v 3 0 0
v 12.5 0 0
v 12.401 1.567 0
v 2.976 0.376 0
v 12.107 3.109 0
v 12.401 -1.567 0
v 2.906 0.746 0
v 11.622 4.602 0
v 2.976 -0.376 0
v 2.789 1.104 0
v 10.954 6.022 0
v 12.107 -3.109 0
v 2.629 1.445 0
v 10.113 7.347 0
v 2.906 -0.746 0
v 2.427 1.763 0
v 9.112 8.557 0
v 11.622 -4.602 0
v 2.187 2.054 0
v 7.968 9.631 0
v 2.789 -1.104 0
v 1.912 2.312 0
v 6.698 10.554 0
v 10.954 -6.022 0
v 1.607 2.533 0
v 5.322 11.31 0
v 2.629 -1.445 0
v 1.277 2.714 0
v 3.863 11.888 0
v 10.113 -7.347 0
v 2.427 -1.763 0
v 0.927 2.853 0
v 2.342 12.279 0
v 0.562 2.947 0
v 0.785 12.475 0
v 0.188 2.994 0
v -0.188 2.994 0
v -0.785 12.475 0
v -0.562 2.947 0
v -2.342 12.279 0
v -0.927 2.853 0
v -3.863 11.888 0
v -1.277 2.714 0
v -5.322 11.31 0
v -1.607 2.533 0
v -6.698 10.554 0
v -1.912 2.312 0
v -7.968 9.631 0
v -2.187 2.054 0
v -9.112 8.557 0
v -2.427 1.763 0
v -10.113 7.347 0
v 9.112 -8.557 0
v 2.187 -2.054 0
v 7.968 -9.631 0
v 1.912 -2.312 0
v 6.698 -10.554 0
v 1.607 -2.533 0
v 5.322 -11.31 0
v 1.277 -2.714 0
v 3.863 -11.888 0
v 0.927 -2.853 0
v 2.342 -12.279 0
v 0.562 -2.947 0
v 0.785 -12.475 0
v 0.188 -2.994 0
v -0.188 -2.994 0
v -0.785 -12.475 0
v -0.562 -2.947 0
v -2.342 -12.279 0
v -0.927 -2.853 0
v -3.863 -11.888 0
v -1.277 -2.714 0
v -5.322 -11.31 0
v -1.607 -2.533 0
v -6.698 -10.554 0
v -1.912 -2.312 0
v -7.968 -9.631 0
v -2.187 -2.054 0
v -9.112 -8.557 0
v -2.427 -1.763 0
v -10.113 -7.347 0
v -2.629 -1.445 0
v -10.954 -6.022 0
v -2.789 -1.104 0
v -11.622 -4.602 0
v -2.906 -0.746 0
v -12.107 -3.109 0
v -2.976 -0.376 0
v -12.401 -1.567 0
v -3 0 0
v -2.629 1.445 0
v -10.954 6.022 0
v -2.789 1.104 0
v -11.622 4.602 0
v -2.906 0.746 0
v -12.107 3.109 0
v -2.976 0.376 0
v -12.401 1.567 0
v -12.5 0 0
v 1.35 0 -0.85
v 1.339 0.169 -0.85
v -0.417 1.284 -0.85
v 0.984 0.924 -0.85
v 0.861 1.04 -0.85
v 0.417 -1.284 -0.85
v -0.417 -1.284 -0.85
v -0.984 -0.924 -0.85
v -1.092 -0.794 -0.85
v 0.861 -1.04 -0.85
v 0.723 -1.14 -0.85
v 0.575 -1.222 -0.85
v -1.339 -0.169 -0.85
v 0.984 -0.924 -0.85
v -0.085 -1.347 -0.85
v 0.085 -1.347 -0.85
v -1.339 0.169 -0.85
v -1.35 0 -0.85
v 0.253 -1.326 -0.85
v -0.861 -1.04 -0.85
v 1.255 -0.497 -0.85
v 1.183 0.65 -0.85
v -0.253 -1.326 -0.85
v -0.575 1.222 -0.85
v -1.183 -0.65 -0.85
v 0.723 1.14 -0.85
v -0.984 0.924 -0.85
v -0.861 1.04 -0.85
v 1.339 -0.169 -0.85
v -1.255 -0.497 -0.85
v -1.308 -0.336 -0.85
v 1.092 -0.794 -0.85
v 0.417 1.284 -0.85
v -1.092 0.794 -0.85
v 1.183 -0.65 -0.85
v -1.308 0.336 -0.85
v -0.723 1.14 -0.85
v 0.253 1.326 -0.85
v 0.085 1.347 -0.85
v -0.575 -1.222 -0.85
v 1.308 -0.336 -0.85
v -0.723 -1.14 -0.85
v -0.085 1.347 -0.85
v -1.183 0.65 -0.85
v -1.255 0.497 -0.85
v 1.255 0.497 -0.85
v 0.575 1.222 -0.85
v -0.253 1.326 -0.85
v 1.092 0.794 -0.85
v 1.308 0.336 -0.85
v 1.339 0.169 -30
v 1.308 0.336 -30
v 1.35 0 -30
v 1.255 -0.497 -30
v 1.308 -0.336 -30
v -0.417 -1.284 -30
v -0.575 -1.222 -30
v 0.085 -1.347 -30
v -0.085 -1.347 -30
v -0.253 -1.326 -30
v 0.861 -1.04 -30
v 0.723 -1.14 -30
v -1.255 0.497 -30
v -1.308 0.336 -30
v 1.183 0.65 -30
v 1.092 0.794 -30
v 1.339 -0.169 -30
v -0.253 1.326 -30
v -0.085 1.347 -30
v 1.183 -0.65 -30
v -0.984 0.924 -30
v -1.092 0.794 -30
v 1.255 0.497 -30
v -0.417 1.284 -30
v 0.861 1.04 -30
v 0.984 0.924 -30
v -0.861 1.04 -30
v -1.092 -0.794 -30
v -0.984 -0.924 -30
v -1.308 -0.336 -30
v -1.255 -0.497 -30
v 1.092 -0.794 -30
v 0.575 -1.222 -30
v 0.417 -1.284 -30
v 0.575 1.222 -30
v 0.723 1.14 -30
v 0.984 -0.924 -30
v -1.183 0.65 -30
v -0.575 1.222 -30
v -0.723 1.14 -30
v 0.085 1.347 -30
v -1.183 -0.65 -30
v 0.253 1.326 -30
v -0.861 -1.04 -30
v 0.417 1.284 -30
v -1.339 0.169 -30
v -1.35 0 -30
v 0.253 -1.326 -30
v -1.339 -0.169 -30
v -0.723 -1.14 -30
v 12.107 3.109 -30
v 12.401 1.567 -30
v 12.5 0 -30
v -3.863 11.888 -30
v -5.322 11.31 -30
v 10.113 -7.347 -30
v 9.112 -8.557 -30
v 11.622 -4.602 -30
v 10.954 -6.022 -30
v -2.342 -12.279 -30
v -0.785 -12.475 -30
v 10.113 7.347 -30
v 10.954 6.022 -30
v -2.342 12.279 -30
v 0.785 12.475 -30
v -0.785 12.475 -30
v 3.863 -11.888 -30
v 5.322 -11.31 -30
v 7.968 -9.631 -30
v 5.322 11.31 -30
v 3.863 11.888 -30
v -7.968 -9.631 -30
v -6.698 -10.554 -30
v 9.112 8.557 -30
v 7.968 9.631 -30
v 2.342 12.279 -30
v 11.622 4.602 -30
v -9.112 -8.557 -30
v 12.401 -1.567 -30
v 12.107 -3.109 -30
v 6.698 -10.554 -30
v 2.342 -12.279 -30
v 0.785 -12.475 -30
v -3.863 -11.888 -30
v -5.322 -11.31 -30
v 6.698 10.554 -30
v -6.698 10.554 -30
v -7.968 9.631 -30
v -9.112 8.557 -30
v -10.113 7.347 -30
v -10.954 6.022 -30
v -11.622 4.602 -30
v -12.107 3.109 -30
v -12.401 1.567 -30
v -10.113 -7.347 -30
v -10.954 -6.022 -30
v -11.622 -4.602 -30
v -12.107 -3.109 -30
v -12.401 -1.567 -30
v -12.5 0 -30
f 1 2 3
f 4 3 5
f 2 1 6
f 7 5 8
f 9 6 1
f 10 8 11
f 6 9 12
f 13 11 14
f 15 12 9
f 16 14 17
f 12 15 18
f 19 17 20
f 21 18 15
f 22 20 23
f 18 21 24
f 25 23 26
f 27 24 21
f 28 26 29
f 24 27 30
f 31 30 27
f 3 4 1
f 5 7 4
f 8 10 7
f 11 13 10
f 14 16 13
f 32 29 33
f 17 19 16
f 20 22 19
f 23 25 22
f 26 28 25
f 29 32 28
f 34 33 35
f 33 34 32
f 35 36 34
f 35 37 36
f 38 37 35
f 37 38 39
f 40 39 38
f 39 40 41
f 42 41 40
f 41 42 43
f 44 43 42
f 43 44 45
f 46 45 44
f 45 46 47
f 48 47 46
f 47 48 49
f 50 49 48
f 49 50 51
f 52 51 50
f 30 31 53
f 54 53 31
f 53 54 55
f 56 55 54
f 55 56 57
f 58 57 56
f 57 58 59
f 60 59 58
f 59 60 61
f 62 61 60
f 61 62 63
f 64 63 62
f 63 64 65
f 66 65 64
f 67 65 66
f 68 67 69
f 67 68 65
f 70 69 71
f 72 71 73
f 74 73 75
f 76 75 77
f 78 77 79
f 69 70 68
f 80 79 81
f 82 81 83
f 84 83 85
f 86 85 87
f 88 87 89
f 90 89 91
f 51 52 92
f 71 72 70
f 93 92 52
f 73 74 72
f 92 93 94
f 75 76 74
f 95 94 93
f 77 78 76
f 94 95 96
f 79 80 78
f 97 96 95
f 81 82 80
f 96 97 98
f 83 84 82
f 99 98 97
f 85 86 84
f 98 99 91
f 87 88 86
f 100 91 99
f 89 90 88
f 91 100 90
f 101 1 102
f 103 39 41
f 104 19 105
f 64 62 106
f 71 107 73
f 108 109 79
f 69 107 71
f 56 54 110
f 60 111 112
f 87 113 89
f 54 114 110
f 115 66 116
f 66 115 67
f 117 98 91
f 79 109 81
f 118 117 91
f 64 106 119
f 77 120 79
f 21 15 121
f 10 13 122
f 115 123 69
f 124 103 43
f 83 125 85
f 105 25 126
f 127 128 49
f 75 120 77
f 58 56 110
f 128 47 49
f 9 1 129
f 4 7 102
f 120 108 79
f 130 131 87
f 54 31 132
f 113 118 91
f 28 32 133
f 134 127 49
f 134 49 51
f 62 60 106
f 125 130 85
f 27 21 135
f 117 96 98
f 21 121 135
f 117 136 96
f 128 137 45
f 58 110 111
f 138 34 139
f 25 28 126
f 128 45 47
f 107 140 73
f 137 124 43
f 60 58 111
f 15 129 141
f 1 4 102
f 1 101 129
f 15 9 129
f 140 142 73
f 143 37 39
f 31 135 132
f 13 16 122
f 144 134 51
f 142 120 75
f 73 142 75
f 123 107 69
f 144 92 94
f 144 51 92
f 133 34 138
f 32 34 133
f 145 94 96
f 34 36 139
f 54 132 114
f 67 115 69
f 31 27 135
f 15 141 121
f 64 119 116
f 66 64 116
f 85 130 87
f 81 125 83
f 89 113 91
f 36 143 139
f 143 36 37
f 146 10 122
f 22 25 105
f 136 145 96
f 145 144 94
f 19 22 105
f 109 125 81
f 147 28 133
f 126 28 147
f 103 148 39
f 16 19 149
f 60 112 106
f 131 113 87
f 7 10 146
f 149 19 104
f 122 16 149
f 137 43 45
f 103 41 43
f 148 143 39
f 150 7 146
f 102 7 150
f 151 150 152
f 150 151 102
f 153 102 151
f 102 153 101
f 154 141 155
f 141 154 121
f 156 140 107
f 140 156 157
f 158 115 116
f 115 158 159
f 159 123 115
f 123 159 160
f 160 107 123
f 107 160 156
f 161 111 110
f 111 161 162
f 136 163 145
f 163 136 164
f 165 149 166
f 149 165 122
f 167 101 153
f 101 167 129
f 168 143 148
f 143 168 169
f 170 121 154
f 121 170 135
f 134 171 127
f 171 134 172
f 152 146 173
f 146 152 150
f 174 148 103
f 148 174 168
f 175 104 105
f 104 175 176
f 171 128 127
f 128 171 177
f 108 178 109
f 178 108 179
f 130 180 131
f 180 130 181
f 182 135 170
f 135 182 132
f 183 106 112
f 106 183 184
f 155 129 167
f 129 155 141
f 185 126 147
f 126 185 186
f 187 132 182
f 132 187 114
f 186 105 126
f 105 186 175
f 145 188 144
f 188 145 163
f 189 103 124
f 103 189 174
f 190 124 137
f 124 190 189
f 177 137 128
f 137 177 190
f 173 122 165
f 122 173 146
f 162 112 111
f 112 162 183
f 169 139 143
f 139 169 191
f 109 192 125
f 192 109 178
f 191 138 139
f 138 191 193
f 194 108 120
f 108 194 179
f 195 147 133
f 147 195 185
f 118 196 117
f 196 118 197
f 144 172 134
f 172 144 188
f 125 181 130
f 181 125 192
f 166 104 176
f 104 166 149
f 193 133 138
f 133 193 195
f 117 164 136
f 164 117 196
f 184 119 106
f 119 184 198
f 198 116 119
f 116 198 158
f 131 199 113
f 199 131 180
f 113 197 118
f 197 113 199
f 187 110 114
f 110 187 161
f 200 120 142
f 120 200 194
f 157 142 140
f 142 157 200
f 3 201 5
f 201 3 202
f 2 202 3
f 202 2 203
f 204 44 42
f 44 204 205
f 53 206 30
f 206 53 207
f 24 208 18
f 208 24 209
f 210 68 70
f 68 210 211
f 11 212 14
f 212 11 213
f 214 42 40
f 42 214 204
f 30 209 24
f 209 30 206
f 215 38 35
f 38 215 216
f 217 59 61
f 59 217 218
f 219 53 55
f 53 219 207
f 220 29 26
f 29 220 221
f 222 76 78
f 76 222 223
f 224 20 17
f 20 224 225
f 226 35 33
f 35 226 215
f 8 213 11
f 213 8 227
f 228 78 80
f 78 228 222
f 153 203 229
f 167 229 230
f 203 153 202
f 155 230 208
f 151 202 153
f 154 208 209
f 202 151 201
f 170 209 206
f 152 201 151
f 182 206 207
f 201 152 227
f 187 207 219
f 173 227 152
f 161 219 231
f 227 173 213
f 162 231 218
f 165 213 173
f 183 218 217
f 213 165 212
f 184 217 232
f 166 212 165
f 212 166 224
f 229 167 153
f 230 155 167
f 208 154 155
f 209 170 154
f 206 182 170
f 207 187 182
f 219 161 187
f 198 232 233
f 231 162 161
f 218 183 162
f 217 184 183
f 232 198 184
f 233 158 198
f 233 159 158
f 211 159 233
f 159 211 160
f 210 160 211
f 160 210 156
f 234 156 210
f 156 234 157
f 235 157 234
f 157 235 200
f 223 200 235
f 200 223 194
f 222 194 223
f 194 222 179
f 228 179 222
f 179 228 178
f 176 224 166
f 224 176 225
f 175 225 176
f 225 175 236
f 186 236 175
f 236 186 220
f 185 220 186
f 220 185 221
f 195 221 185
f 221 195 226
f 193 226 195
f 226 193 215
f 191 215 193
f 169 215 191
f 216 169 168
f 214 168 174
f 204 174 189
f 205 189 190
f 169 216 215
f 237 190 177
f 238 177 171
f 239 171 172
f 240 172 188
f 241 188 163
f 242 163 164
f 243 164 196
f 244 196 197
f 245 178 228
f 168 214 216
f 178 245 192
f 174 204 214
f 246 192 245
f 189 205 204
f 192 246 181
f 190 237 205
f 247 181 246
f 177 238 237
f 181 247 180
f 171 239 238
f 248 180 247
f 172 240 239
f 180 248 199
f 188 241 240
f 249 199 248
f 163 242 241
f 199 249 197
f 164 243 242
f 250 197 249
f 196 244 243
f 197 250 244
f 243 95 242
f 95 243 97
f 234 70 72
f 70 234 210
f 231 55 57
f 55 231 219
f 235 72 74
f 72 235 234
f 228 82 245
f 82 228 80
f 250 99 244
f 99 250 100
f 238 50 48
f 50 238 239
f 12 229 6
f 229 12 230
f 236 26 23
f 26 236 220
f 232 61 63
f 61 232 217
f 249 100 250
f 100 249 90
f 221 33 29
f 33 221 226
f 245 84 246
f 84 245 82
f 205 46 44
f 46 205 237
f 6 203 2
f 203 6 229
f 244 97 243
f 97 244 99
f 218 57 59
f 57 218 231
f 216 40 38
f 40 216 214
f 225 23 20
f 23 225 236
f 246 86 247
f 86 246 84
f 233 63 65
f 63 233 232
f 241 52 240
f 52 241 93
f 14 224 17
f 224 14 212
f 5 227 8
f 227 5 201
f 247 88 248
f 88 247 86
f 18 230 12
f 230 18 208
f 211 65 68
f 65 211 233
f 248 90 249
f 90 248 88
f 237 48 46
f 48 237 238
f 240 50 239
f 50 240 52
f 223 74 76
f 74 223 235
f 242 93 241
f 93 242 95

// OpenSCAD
$fn = 50;

difference() {
	union() {
		translate(v = [0, 0, -30.0]) {
			cylinder(h = 30, r = 12.5);
		}
	}
	union() {
		translate(v = [0, 0, 0]) {
			rotate(a = [0, 0, 0]) {
				difference() {
					union() {
						translate(v = [0, 0, -33.0]) {
							cylinder(h = 33, r = 1.0);
						}
						translate(v = [0, 0, -0.85]) {
							cylinder(h = 0.85, r1 = 1.35, r2 = 3.0);
						}
						translate(v = [0, 0, -33.0]) {
							cylinder(h = 33, r = 1.35);
						}
						translate(v = [0, 0, -33.0]) {
							cylinder(h = 33, r = 1.0);
						}
					}
					union();
				}
			}
		}
	}
}
